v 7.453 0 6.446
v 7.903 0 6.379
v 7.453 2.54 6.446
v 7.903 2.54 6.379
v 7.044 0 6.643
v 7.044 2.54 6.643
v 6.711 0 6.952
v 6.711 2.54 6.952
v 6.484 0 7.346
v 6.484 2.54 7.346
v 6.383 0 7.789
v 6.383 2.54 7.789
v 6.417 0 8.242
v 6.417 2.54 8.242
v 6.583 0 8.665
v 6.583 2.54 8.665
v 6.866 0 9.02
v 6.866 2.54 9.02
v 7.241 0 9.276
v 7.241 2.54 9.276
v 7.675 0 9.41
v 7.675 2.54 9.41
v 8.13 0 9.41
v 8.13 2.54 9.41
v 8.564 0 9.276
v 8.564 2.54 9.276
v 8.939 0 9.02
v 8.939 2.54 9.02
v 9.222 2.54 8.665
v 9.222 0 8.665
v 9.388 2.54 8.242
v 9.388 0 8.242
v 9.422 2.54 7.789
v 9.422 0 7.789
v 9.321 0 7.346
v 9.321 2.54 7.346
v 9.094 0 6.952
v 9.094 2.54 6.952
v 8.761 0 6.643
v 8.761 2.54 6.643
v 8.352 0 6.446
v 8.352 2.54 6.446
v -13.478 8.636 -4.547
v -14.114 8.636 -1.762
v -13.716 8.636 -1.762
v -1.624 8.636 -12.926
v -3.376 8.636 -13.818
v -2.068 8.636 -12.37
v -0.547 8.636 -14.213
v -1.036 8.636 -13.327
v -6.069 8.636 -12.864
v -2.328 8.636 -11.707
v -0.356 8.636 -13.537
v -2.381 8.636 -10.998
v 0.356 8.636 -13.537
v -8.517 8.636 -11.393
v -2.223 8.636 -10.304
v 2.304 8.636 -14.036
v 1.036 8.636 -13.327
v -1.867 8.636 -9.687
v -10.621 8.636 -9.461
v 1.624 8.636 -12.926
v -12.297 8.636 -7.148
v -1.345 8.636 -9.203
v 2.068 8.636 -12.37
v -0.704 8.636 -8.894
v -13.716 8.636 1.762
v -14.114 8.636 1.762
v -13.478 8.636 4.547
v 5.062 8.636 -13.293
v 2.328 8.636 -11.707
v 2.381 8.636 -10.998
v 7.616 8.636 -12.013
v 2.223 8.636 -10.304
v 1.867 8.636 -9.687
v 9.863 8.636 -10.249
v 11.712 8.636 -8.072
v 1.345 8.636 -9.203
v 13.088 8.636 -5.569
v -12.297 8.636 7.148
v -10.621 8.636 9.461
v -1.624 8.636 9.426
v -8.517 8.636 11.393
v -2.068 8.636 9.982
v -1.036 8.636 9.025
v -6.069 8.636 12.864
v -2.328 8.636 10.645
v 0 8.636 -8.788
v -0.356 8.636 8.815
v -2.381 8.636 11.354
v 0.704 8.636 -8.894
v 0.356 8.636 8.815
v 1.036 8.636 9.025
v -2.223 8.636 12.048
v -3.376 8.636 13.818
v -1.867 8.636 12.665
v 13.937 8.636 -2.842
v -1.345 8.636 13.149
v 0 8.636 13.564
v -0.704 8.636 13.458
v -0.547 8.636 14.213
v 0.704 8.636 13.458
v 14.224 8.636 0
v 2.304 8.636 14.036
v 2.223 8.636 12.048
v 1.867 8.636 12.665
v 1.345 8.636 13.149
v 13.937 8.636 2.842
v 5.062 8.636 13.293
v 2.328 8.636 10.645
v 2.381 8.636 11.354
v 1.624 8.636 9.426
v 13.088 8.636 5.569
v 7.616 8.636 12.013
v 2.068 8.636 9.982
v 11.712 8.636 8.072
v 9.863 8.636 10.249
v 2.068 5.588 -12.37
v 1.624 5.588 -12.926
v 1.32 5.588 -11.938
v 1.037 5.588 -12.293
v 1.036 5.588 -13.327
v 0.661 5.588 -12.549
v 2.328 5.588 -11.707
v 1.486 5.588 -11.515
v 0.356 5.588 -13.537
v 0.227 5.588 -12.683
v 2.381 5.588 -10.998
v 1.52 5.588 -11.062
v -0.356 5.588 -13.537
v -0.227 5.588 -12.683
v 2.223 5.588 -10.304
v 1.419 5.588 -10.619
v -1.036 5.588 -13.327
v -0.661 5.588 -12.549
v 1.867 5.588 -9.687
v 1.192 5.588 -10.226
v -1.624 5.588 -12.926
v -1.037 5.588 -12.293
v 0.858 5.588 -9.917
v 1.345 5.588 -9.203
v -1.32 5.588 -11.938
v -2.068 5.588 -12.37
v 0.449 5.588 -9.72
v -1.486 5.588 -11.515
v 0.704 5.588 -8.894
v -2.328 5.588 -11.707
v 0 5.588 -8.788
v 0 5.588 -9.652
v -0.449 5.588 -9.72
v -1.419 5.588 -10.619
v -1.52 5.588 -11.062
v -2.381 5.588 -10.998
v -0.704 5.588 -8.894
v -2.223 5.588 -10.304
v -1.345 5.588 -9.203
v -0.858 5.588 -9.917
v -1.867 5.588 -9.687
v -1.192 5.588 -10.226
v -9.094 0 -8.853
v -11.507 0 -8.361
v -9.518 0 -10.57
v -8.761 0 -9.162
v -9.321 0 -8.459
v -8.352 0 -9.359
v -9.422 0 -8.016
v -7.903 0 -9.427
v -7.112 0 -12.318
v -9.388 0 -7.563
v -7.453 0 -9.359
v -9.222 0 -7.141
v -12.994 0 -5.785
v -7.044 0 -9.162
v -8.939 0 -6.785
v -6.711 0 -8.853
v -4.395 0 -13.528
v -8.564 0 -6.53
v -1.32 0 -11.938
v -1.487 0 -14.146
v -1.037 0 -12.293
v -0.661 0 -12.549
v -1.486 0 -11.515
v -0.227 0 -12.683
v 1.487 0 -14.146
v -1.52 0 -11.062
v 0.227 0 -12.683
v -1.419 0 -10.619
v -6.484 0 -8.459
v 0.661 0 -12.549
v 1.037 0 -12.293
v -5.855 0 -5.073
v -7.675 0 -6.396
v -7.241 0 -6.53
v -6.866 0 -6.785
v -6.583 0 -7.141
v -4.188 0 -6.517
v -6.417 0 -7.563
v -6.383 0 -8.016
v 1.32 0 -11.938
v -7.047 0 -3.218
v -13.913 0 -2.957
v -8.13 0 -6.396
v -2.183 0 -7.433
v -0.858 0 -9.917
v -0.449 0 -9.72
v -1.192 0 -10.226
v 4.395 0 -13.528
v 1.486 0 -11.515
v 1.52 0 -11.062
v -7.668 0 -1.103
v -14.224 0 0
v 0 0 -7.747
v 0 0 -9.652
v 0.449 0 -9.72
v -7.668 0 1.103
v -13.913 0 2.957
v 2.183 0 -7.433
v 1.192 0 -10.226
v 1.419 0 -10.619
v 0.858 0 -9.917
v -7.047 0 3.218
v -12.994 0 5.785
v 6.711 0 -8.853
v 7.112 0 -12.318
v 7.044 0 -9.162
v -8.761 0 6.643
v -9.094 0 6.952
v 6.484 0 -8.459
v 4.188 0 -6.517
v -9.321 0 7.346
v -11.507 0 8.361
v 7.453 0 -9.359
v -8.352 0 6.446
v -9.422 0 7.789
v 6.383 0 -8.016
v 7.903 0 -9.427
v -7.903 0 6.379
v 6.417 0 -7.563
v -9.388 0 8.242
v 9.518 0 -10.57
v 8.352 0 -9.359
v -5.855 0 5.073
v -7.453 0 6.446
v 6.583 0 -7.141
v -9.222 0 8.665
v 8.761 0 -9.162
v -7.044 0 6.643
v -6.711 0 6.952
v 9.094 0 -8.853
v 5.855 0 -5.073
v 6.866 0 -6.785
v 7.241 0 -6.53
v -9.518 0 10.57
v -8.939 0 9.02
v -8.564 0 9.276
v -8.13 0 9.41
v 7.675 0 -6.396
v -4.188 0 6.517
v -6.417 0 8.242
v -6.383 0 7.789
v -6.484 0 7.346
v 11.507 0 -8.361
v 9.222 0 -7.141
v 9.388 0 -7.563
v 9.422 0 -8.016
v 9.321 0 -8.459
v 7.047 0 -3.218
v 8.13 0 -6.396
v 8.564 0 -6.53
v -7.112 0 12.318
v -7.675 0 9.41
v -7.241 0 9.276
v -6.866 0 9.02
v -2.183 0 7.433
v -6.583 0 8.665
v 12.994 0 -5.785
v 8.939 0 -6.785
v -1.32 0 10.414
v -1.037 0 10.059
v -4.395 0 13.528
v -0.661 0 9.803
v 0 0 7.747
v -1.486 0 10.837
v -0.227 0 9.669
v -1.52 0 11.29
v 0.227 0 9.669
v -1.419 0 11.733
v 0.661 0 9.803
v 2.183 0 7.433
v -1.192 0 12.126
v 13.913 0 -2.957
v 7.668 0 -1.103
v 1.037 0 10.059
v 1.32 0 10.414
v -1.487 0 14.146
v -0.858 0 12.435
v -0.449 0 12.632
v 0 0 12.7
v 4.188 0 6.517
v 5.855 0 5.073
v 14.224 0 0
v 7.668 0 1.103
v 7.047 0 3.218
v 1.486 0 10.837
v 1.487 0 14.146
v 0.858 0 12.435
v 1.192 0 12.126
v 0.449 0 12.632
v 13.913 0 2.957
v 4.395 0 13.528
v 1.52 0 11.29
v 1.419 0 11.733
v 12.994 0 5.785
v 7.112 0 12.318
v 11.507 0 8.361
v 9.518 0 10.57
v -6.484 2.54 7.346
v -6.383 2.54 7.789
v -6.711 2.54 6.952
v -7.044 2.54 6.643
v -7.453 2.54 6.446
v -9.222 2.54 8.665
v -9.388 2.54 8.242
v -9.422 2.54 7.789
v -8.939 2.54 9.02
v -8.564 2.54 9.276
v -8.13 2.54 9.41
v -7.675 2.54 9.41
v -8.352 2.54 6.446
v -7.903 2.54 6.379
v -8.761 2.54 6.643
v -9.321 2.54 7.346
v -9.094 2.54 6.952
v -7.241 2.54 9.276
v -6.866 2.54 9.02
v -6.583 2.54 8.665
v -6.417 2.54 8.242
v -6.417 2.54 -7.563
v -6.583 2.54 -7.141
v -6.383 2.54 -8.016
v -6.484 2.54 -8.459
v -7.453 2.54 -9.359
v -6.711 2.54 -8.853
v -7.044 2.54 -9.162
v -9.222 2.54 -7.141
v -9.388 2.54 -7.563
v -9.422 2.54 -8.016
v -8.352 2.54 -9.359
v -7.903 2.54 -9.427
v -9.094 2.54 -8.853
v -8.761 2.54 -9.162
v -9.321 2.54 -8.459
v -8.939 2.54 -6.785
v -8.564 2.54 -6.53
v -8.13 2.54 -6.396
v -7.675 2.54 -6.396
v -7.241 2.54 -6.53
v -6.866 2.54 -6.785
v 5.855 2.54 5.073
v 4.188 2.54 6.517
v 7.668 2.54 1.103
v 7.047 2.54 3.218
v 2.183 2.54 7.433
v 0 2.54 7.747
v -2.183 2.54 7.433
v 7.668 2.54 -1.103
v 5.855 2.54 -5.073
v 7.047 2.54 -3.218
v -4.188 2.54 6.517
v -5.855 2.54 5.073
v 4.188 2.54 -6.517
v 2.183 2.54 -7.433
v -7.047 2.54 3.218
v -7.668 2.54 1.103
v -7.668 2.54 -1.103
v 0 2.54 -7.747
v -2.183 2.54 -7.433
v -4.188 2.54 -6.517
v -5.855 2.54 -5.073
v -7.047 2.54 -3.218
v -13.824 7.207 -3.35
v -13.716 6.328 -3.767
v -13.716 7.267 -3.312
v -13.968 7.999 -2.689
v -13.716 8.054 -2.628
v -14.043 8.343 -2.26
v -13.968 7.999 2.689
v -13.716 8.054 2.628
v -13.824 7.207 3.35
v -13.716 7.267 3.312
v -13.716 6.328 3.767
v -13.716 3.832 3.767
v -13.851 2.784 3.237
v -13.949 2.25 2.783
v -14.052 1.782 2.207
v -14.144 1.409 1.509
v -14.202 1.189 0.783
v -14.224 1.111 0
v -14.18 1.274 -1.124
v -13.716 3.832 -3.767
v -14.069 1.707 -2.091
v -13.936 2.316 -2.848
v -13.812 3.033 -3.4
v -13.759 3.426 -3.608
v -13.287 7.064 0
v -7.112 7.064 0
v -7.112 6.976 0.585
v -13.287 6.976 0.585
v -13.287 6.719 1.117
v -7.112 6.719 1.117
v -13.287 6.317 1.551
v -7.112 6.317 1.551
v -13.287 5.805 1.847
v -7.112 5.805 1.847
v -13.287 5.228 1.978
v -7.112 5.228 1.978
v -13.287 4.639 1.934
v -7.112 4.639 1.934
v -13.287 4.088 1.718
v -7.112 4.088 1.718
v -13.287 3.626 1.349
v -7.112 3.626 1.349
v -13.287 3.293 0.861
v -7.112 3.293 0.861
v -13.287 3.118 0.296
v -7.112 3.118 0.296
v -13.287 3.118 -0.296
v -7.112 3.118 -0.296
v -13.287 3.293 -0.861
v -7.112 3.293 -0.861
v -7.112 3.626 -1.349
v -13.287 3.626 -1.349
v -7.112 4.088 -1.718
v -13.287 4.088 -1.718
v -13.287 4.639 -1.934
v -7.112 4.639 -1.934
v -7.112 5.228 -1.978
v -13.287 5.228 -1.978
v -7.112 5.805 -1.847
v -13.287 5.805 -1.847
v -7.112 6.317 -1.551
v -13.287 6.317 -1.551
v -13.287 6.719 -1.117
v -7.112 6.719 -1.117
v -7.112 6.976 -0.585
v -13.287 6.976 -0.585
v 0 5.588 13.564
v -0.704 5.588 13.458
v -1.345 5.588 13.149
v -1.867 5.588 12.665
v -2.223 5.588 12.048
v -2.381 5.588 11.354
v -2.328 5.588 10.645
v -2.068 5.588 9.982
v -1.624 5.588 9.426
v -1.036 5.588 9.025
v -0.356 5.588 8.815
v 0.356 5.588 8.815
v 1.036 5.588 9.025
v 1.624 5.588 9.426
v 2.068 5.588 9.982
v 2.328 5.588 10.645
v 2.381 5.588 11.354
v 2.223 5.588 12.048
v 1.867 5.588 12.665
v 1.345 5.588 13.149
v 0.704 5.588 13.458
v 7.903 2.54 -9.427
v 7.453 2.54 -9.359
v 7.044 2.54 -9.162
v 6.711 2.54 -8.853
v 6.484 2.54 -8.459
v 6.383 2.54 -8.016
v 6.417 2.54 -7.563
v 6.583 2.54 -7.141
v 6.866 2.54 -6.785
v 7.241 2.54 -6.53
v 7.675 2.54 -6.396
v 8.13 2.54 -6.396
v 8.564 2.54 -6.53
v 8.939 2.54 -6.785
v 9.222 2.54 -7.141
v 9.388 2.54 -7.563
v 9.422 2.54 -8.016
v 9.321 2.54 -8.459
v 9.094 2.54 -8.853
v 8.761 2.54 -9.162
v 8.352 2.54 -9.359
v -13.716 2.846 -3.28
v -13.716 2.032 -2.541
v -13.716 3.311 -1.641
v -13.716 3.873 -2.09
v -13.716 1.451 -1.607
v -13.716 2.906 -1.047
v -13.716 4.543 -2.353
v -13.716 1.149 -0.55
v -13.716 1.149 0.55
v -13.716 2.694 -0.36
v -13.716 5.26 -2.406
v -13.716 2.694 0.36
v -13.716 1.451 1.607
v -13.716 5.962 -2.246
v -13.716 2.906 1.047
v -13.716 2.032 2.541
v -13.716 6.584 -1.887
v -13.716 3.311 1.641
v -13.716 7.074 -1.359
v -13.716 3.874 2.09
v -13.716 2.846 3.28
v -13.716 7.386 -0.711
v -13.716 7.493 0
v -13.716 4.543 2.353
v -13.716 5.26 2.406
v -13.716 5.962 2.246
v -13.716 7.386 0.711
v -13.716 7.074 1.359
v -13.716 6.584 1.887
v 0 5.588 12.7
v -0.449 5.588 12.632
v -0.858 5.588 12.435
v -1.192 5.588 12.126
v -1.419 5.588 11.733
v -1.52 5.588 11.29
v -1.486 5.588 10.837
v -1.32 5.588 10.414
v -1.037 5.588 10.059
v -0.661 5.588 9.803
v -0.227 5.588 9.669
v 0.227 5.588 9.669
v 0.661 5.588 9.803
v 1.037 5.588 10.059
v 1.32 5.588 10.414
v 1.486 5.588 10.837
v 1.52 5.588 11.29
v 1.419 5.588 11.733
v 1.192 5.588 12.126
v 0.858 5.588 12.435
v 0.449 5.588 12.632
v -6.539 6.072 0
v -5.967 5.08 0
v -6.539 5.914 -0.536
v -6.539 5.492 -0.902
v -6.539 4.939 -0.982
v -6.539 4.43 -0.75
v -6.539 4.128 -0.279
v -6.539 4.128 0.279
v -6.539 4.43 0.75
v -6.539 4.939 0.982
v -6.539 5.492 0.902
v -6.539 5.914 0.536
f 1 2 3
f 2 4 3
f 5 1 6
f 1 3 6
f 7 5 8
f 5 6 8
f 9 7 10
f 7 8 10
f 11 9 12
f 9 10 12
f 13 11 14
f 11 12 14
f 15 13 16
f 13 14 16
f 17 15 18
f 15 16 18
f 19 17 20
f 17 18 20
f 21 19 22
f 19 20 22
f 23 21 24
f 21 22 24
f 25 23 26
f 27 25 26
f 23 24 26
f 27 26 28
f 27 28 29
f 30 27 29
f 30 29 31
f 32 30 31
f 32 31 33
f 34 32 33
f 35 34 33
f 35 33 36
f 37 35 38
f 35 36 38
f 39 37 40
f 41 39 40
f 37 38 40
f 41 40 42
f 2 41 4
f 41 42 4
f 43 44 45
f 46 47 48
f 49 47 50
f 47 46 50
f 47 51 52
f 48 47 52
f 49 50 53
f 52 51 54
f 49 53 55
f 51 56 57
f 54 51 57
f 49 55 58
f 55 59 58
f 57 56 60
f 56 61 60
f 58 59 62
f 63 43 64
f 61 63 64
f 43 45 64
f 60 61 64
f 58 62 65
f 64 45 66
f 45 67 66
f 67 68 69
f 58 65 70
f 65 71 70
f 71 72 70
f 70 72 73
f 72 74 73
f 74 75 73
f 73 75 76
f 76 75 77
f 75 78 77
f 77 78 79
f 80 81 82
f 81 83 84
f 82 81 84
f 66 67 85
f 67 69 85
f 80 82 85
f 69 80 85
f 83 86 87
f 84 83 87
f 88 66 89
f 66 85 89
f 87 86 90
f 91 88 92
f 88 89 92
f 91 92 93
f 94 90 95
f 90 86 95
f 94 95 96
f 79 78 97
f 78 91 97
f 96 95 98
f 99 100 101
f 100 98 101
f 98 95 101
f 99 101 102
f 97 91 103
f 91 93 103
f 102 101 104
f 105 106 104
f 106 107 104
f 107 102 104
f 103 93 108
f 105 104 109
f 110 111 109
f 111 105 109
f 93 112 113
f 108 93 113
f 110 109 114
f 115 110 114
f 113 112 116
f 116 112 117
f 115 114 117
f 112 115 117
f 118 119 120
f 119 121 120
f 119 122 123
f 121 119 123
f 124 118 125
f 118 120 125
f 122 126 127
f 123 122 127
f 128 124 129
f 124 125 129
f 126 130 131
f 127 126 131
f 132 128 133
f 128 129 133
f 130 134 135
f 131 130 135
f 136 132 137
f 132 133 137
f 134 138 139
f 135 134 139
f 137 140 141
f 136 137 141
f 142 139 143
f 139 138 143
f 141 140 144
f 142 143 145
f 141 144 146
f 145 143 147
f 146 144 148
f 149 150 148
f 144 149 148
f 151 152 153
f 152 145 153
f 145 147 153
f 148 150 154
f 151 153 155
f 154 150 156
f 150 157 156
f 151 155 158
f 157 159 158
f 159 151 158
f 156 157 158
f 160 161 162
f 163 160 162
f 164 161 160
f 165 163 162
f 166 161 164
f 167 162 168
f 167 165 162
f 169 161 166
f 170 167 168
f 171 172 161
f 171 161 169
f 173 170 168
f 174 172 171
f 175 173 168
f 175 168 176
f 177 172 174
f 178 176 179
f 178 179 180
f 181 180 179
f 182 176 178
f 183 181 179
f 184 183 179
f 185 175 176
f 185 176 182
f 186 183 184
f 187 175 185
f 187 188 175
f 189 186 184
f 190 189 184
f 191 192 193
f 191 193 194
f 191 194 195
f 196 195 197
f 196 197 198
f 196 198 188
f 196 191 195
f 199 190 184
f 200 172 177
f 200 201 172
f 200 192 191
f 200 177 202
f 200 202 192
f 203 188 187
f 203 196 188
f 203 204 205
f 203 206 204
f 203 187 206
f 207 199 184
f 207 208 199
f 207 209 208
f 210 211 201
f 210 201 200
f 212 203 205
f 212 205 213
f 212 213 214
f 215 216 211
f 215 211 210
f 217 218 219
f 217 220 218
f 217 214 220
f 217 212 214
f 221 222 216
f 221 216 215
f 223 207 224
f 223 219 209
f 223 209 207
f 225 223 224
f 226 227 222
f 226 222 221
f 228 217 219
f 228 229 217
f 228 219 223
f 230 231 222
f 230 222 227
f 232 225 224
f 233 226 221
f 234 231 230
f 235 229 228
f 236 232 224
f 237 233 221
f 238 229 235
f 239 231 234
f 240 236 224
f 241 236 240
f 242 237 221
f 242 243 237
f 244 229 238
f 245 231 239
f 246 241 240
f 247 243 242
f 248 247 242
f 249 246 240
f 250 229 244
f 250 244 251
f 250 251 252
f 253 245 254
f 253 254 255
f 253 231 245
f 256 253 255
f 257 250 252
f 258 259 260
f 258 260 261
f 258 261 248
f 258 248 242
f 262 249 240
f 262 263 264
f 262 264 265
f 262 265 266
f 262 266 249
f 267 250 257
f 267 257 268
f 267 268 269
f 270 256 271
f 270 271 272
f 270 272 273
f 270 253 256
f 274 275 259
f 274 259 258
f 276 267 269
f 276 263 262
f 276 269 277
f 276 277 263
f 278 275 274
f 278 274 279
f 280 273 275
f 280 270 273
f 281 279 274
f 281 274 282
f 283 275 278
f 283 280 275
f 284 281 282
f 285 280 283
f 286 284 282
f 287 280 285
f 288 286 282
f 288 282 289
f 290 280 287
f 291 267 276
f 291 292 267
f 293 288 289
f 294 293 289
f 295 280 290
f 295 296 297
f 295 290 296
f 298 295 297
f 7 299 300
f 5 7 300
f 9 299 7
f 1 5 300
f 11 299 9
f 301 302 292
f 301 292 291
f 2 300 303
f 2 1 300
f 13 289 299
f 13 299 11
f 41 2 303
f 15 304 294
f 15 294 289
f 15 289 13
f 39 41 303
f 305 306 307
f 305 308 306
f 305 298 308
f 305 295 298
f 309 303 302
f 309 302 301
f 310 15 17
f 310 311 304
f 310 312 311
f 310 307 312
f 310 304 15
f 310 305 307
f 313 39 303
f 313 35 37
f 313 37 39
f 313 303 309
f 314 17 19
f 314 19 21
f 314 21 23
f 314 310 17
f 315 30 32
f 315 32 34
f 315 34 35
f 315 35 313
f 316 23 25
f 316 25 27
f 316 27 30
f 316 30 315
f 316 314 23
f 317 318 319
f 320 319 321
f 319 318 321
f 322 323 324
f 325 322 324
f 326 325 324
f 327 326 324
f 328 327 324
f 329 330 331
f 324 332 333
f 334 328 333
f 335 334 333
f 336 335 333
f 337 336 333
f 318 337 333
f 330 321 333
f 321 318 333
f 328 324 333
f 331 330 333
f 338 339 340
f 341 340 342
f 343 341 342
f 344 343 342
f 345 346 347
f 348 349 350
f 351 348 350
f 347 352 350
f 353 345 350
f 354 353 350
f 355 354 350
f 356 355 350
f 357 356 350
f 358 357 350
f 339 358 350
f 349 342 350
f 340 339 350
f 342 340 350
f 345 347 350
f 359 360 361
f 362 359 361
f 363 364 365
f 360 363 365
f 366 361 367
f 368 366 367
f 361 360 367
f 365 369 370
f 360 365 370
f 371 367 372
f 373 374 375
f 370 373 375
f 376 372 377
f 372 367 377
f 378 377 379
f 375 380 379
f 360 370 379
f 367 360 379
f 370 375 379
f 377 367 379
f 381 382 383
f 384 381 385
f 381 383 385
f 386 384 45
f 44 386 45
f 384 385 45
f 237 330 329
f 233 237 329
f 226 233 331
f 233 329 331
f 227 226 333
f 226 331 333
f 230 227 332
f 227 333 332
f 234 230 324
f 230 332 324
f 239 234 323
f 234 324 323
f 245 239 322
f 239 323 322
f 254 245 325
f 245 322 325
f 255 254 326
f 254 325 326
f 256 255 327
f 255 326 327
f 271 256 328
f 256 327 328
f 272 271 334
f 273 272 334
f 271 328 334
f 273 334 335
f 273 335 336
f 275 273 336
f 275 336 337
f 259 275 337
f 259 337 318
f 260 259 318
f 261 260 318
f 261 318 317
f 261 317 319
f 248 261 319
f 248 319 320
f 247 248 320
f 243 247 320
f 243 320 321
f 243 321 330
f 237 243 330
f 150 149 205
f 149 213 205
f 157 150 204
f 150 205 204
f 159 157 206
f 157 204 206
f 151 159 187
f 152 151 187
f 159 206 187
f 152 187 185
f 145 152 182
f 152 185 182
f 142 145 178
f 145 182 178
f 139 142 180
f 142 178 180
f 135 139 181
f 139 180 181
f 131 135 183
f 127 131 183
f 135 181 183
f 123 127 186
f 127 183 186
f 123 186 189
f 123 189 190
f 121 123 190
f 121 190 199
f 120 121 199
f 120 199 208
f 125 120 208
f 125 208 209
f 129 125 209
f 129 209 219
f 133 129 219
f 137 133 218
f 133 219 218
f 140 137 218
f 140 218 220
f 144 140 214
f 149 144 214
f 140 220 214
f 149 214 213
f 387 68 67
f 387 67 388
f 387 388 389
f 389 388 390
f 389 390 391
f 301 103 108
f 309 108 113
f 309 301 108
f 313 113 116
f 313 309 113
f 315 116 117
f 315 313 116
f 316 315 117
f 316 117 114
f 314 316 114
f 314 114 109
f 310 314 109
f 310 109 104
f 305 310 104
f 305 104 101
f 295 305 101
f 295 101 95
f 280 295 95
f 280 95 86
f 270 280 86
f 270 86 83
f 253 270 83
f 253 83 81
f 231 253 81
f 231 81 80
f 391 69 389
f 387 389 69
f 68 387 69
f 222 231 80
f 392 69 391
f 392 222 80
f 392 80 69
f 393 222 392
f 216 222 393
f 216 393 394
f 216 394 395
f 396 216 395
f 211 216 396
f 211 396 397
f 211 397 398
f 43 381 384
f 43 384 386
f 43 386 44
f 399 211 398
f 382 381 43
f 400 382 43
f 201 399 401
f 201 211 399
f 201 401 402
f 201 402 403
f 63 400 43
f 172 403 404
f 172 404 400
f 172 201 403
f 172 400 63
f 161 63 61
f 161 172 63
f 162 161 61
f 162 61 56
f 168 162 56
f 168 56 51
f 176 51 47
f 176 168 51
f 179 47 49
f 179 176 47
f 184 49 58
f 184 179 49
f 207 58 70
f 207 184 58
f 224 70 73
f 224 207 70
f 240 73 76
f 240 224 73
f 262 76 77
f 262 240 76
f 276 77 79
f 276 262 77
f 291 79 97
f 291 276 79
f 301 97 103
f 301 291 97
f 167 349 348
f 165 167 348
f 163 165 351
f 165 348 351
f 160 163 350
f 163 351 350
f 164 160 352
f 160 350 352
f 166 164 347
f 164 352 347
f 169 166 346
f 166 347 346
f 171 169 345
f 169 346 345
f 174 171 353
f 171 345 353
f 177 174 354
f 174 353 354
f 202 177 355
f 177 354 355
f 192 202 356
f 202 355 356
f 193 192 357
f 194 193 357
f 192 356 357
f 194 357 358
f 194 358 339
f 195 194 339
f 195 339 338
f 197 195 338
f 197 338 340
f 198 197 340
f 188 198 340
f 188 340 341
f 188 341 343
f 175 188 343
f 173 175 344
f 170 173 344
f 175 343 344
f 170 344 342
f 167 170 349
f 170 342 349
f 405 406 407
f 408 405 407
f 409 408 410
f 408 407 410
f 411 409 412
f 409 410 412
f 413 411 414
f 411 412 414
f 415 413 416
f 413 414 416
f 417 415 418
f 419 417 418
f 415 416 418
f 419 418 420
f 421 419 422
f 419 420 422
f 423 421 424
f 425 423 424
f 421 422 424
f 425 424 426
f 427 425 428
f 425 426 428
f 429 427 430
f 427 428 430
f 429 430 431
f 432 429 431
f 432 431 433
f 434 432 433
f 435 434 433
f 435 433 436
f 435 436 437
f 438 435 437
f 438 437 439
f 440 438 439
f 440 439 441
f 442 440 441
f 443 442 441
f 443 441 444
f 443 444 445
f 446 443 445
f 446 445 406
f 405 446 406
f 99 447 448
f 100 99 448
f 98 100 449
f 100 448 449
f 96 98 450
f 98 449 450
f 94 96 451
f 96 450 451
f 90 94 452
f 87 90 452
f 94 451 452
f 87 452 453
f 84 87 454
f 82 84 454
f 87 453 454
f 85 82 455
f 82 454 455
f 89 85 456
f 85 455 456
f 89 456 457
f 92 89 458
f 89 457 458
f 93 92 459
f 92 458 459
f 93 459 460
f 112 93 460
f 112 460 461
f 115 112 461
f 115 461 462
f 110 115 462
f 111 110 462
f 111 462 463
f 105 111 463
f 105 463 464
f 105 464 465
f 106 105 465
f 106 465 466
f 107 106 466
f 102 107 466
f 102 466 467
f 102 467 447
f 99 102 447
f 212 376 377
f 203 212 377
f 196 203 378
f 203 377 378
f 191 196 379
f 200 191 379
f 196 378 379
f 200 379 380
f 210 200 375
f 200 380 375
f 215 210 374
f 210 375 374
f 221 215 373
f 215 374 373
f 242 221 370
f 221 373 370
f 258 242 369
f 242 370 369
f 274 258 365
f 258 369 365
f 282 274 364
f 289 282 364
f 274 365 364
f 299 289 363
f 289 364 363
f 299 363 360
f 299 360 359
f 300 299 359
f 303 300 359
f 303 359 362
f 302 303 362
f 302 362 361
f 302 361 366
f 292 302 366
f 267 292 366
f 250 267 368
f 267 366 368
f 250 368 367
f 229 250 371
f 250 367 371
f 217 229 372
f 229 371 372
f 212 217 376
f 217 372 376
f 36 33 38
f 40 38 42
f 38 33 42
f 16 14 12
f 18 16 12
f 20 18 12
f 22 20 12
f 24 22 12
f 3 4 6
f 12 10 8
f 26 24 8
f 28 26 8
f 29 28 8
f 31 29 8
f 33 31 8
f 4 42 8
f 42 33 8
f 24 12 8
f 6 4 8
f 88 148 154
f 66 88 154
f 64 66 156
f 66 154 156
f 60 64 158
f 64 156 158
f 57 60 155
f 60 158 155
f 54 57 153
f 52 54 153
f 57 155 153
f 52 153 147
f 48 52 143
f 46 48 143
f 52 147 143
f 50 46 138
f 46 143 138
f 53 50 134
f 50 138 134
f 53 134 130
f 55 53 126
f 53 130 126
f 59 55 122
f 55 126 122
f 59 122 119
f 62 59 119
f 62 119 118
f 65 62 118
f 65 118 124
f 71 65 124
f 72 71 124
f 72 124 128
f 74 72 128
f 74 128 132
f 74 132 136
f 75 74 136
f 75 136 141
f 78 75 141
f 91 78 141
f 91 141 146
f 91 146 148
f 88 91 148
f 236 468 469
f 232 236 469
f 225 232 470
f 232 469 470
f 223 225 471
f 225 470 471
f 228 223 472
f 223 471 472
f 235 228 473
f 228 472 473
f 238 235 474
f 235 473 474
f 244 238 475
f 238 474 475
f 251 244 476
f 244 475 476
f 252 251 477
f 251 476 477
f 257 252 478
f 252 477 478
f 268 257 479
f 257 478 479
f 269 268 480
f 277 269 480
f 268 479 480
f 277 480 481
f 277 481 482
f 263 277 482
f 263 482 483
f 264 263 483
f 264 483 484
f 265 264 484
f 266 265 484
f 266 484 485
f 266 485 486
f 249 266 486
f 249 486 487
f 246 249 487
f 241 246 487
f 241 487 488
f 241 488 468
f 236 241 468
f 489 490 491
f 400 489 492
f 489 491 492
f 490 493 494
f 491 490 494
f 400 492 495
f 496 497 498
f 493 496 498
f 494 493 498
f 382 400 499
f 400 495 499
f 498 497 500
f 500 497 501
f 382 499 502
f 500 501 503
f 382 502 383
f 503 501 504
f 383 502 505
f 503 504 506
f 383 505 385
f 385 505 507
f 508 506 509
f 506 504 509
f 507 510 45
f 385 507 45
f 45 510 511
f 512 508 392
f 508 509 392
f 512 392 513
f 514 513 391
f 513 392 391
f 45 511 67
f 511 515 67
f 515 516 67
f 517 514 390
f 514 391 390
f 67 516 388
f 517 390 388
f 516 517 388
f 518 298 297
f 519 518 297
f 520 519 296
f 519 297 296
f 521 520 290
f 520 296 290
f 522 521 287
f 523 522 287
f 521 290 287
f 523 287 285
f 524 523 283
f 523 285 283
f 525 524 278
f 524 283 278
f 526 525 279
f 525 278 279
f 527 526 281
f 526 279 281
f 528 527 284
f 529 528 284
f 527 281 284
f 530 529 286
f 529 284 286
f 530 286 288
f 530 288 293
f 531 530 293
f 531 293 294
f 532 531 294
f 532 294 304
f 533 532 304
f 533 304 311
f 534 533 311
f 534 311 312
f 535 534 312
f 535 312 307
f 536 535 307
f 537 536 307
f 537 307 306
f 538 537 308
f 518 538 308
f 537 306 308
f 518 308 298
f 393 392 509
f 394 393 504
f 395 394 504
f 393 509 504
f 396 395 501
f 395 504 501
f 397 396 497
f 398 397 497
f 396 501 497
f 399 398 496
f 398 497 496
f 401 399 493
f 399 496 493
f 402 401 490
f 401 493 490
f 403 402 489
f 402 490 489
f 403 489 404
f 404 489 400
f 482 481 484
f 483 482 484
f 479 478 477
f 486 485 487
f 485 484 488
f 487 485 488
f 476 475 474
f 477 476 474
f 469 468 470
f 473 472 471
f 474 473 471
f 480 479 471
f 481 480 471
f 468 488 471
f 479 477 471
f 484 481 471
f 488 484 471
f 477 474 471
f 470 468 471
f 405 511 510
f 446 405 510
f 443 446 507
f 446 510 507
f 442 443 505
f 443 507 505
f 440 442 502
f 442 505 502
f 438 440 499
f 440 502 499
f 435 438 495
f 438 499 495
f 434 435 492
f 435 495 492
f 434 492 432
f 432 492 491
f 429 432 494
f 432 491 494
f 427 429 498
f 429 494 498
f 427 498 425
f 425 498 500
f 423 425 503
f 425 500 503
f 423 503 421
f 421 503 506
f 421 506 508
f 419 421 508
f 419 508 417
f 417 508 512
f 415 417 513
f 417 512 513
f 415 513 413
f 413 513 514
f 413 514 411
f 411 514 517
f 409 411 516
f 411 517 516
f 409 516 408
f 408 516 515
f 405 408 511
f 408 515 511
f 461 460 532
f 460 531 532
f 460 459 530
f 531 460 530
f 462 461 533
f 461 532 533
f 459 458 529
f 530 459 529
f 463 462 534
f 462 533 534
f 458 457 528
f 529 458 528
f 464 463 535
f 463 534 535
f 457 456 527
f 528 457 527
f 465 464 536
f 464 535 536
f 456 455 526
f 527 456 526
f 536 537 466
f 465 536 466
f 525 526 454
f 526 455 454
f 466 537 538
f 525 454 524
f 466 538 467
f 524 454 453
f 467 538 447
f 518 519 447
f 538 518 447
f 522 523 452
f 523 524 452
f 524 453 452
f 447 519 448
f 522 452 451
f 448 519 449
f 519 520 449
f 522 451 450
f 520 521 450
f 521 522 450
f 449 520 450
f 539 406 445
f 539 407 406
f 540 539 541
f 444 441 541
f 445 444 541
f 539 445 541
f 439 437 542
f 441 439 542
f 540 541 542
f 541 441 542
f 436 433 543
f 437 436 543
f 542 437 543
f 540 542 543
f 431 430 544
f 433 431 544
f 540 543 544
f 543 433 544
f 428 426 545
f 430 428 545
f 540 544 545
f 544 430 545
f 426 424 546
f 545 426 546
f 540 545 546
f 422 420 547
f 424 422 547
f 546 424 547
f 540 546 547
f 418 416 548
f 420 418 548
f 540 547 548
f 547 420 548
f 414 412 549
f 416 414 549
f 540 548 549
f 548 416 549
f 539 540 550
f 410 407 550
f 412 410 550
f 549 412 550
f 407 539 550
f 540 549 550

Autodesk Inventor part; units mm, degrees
sketch "Sketch_1" plane through (0, 0, 0) normal (0, 0, 1) x (1, 0, 0)
  line L0 (0, 0) -> (0, 8.636)
  line L1 (0, 8.636) -> (14.224, 8.636)
  line L2 (14.224, 8.636) -> (14.224, 0)
  line L3 (14.224, 0) -> (0, 0)
  line L4 (0, 0) -> (0, 8.636)
revolve "Revolution1" add sketch "Sketch_1" angle 360 about axis through (0, 0, 0) along (0, -1, 0)
sketch "Sketch_37" plane through (0, 0, 0) normal (0, 0, 1) x (1, 0, 0)
  line L0 (-5.9667, 5.08) -> (-14.224, 5.08)
  line L1 (-14.224, 5.08) -> (-14.224, 9.0488)
  line L2 (-14.224, 9.0488) -> (-13.716, 9.0488)
  line L3 (-13.716, 9.0488) -> (-13.716, 7.493)
  line L4 (-13.716, 7.493) -> (-13.2867, 7.0637)
  line L5 (-13.2867, 7.0637) -> (-7.112, 7.0637)
  line L6 (-7.112, 7.0637) -> (-5.9667, 5.08)
  line L7 (-5.9667, 5.08) -> (-14.224, 5.08)
revolve "Revolution2" cut sketch "Sketch_37" angle 360 about axis through (-5.9667, 5.08, 0) along (1, 0, 0)
thread "Thread1" size "10-32 UNF" class "2B" standard "ANSI Unified Screw Threads" length 5.08 offset 1.524
sketch "Sketch3" plane through (0, 0, 0) normal (0, -1, 0) x (1, 0, 0)
  point P0 (0, 0)
hole "Hole1" at (0, 0, 0) direction (0, 1, 0) diameter 15.494 depth 2.54
sketch "Sketch4" plane through (0, 8.636, 0) normal (0, 1, 0) x (1, 0, 0)
  point P0 (0, -11.176)
hole "Hole2" at (0, 8.636, 11.176) direction (0, -1, 0) diameter 3.048 depth 8.636 counterbore diameter 4.7752 counterbore depth 3.048
sketch "Sketch5" plane through (0, 8.636, 0) normal (0, 1, 0) x (1, 0, 0)
  point P0 (0, 11.176)
hole "Hole3" at (0, 8.636, -11.176) direction (0, -1, 0) diameter 3.048 depth 8.636 counterbore diameter 4.7752 counterbore depth 3.048
sketch "Sketch6" plane through (0, 0, 0) normal (0, -1, 0) x (1, 0, 0)
  point P0 (-7.9026, 7.9026)
hole "Hole4" at (-7.9026, 0, 7.9026) direction (0, 1, 0) diameter 3.048 depth 2.54
sketch "Sketch7" plane through (0, 0, 0) normal (0, -1, 0) x (1, 0, 0)
  point P0 (7.9026, 7.9026)
hole "Hole5" at (7.9026, 0, 7.9026) direction (0, 1, 0) diameter 3.048 depth 2.54
sketch "Sketch8" plane through (0, 0, 0) normal (0, -1, 0) x (1, 0, 0)
  point P0 (7.9026, -7.9026)
hole "Hole6" at (7.9026, 0, -7.9026) direction (0, 1, 0) diameter 3.048 depth 2.54
sketch "Sketch9" plane through (0, 0, 0) normal (0, -1, 0) x (1, 0, 0)
  point P0 (-7.9026, -7.9026)
hole "Hole7" at (-7.9026, 0, -7.9026) direction (0, 1, 0) diameter 3.048 depth 2.54
ref_plane "a1_XY" through (0, 8.636, -14.224) normal (0, 1, 0) x (1, 0, 0)
ref_plane "a1_YZ" through (0, 8.636, -14.224) normal (1, 0, 0) x (0, 0, -1)
ref_plane "a1_ZX" through (0, 8.636, -14.224) normal (0, 0, -1) x (0, 1, 0)
ref_plane "a2_XY" through (0, 8.636, 14.224) normal (0, 1, 0) x (1, 0, 0)
ref_plane "a2_YZ" through (0, 8.636, 14.224) normal (1, 0, 0) x (0, 0, -1)
ref_plane "a2_ZX" through (0, 8.636, 14.224) normal (0, 0, -1) x (0, 1, 0)
ref_plane "ar3_XY" through (-7.9026, 2.54, 7.9026) normal (0, 1, 0) x (1, 0, 0)
ref_plane "ar3_YZ" through (-7.9026, 2.54, 7.9026) normal (1, 0, 0) x (0, 0, -1)
ref_plane "ar3_ZX" through (-7.9026, 2.54, 7.9026) normal (0, 0, -1) x (0, 1, 0)
ref_plane "ar4_XY" through (7.9026, 2.54, 7.9026) normal (0, 1, 0) x (1, 0, 0)
ref_plane "ar4_YZ" through (7.9026, 2.54, 7.9026) normal (1, 0, 0) x (0, 0, -1)
ref_plane "ar4_ZX" through (7.9026, 2.54, 7.9026) normal (0, 0, -1) x (0, 1, 0)
ref_plane "ar5_XY" through (7.9026, 2.54, -7.9026) normal (0, 1, 0) x (1, 0, 0)
ref_plane "ar5_YZ" through (7.9026, 2.54, -7.9026) normal (1, 0, 0) x (0, 0, -1)
ref_plane "ar5_ZX" through (7.9026, 2.54, -7.9026) normal (0, 0, -1) x (0, 1, 0)
ref_plane "ar6_XY" through (-7.9026, 2.54, -7.9026) normal (0, 1, 0) x (1, 0, 0)
ref_plane "ar6_YZ" through (-7.9026, 2.54, -7.9026) normal (1, 0, 0) x (0, 0, -1)
ref_plane "ar6_ZX" through (-7.9026, 2.54, -7.9026) normal (0, 0, -1) x (0, 1, 0)
ref_plane "b1_XY" through (0, 8.636, 0) normal (0, 1, 0) x (1, 0, 0)
ref_plane "b1_YZ" through (0, 8.636, 0) normal (1, 0, 0) x (0, 0, -1)
ref_plane "b1_ZX" through (0, 8.636, 0) normal (0, 0, -1) x (0, 1, 0)
ref_plane "c1_XY" through (0, 8.636, -11.176) normal (0, 1, 0) x (1, 0, 0)
ref_plane "c1_YZ" through (0, 8.636, -11.176) normal (1, 0, 0) x (0, 0, -1)
ref_plane "c1_ZX" through (0, 8.636, -11.176) normal (0, 0, -1) x (0, 1, 0)
ref_plane "c2_XY" through (0, 8.636, 11.176) normal (0, 1, 0) x (1, 0, 0)
ref_plane "c2_YZ" through (0, 8.636, 11.176) normal (1, 0, 0) x (0, 0, -1)
ref_plane "c2_ZX" through (0, 8.636, 11.176) normal (0, 0, -1) x (0, 1, 0)
ref_plane "d1_XY" through (-1.524, 8.636, -11.176) normal (0, 1, 0) x (1, 0, 0)
ref_plane "d1_YZ" through (-1.524, 8.636, -11.176) normal (1, 0, 0) x (0, 0, -1)
ref_plane "d1_ZX" through (-1.524, 8.636, -11.176) normal (0, 0, -1) x (0, 1, 0)
ref_plane "d2_XY" through (1.524, 8.636, -11.176) normal (0, 1, 0) x (1, 0, 0)
ref_plane "d2_YZ" through (1.524, 8.636, -11.176) normal (1, 0, 0) x (0, 0, -1)
ref_plane "d2_ZX" through (1.524, 8.636, -11.176) normal (0, 0, -1) x (0, 1, 0)
ref_plane "j_XY" through (0, 0, 0) normal (0, 1, 0) x (1, 0, 0)
ref_plane "j_YZ" through (0, 0, 0) normal (1, 0, 0) x (0, 0, -1)
ref_plane "j_ZX" through (0, 0, 0) normal (0, 0, -1) x (0, 1, 0)
ref_plane "k1_XY" through (-14.224, 5.08, 0) normal (0, 0, 1) x (1, 0, 0)
ref_plane "k1_YZ" through (-14.224, 5.08, 0) normal (1, 0, 0) x (0, 1, 0)
ref_plane "k1_ZX" through (-14.224, 5.08, 0) normal (0, 1, 0) x (0, 0, 1)
ref_plane "k2_XY" through (-14.224, 8.636, 0) normal (0, 0, 1) x (1, 0, 0)
ref_plane "k2_YZ" through (-14.224, 8.636, 0) normal (1, 0, 0) x (0, 1, 0)
ref_plane "k2_ZX" through (-14.224, 8.636, 0) normal (0, 1, 0) x (0, 0, 1)
ref_plane "l1_XY" through (-14.224, 7.493, 0) normal (0, 0, 1) x (1, 0, 0)
ref_plane "l1_YZ" through (-14.224, 7.493, 0) normal (1, 0, 0) x (0, 1, 0)
ref_plane "l1_ZX" through (-14.224, 7.493, 0) normal (0, 1, 0) x (0, 0, 1)
ref_plane "l2_XY" through (-14.224, 2.667, 0) normal (0, 0, 1) x (1, 0, 0)
ref_plane "l2_YZ" through (-14.224, 2.667, 0) normal (1, 0, 0) x (0, 1, 0)
ref_plane "l2_ZX" through (-14.224, 2.667, 0) normal (0, 1, 0) x (0, 0, 1)
ref_plane "rg_XY" through (0, 8.636, 0) normal (0, 1, 0) x (1, 0, 0)
ref_plane "rg_YZ" through (0, 8.636, 0) normal (1, 0, 0) x (0, 0, -1)
ref_plane "rg_ZX" through (0, 8.636, 0) normal (0, 0, -1) x (0, 1, 0)
ref_plane "rh_XY" through (0, 8.636, 0) normal (0, 1, 0) x (1, 0, 0)
ref_plane "rh_YZ" through (0, 8.636, 0) normal (1, 0, 0) x (0, 0, -1)
ref_plane "rh_ZX" through (0, 8.636, 0) normal (0, 0, -1) x (0, 1, 0)
ref_plane "to_dummy_XY" through (0, 8.636, 0) normal (0, 1, 0) x (1, 0, 0)
ref_plane "to_dummy_YZ" through (0, 8.636, 0) normal (1, 0, 0) x (0, 0, -1)
ref_plane "to_dummy_ZX" through (0, 8.636, 0) normal (0, 0, -1) x (0, 1, 0)
ref_plane "to_nut_XY" through (0, 10.16, 0) normal (0, 1, 0) x (1, 0, 0)
ref_plane "to_nut_YZ" through (0, 10.16, 0) normal (1, 0, 0) x (0, 0, -1)
ref_plane "to_nut_ZX" through (0, 10.16, 0) normal (0, 0, -1) x (0, 1, 0)
ref_plane "to_rod_XY" through (0, 8.636, 0) normal (0, 1, 0) x (1, 0, 0)
ref_plane "to_rod_YZ" through (0, 8.636, 0) normal (1, 0, 0) x (0, 0, -1)
ref_plane "to_rod_ZX" through (0, 8.636, 0) normal (0, 0, -1) x (0, 1, 0)
ref_plane "to_tube_XY" through (0, 2.54, 0) normal (0, 1, 0) x (1, 0, 0)
ref_plane "to_tube_YZ" through (0, 2.54, 0) normal (1, 0, 0) x (0, 0, -1)
ref_plane "to_tube_ZX" through (0, 2.54, 0) normal (0, 0, -1) x (0, 1, 0)
ref_plane "to_wiper_XY" through (0, 8.636, 0) normal (0, 1, 0) x (1, 0, 0)
ref_plane "to_wiper_YZ" through (0, 8.636, 0) normal (1, 0, 0) x (0, 0, -1)
ref_plane "to_wiper_ZX" through (0, 8.636, 0) normal (0, 0, -1) x (0, 1, 0)
ref_plane "track1_XY" through (-7.874, 0, 0) normal (0, 1, 0) x (1, 0, 0)
ref_plane "track1_YZ" through (-7.874, 0, 0) normal (1, 0, 0) x (0, 0, -1)
ref_plane "track1_ZX" through (-7.874, 0, 0) normal (0, 0, -1) x (0, 1, 0)
ref_plane "track2_XY" through (0, 0, -7.874) normal (0, 1, 0) x (1, 0, 0)
ref_plane "track2_YZ" through (0, 0, -7.874) normal (1, 0, 0) x (0, 0, -1)
ref_plane "track2_ZX" through (0, 0, -7.874) normal (0, 0, -1) x (0, 1, 0)
ref_plane "track3_XY" through (7.874, 0, 0) normal (0, 1, 0) x (1, 0, 0)
ref_plane "track3_YZ" through (7.874, 0, 0) normal (1, 0, 0) x (0, 0, -1)
ref_plane "track3_ZX" through (7.874, 0, 0) normal (0, 0, -1) x (0, 1, 0)
ref_plane "track4_XY" through (0, 0, 7.874) normal (0, 1, 0) x (1, 0, 0)
ref_plane "track4_YZ" through (0, 0, 7.874) normal (1, 0, 0) x (0, 0, -1)
ref_plane "track4_ZX" through (0, 0, 7.874) normal (0, 0, -1) x (0, 1, 0)
properties part number "02-2-0.13-FO1_BM_heads" material "Steel"
